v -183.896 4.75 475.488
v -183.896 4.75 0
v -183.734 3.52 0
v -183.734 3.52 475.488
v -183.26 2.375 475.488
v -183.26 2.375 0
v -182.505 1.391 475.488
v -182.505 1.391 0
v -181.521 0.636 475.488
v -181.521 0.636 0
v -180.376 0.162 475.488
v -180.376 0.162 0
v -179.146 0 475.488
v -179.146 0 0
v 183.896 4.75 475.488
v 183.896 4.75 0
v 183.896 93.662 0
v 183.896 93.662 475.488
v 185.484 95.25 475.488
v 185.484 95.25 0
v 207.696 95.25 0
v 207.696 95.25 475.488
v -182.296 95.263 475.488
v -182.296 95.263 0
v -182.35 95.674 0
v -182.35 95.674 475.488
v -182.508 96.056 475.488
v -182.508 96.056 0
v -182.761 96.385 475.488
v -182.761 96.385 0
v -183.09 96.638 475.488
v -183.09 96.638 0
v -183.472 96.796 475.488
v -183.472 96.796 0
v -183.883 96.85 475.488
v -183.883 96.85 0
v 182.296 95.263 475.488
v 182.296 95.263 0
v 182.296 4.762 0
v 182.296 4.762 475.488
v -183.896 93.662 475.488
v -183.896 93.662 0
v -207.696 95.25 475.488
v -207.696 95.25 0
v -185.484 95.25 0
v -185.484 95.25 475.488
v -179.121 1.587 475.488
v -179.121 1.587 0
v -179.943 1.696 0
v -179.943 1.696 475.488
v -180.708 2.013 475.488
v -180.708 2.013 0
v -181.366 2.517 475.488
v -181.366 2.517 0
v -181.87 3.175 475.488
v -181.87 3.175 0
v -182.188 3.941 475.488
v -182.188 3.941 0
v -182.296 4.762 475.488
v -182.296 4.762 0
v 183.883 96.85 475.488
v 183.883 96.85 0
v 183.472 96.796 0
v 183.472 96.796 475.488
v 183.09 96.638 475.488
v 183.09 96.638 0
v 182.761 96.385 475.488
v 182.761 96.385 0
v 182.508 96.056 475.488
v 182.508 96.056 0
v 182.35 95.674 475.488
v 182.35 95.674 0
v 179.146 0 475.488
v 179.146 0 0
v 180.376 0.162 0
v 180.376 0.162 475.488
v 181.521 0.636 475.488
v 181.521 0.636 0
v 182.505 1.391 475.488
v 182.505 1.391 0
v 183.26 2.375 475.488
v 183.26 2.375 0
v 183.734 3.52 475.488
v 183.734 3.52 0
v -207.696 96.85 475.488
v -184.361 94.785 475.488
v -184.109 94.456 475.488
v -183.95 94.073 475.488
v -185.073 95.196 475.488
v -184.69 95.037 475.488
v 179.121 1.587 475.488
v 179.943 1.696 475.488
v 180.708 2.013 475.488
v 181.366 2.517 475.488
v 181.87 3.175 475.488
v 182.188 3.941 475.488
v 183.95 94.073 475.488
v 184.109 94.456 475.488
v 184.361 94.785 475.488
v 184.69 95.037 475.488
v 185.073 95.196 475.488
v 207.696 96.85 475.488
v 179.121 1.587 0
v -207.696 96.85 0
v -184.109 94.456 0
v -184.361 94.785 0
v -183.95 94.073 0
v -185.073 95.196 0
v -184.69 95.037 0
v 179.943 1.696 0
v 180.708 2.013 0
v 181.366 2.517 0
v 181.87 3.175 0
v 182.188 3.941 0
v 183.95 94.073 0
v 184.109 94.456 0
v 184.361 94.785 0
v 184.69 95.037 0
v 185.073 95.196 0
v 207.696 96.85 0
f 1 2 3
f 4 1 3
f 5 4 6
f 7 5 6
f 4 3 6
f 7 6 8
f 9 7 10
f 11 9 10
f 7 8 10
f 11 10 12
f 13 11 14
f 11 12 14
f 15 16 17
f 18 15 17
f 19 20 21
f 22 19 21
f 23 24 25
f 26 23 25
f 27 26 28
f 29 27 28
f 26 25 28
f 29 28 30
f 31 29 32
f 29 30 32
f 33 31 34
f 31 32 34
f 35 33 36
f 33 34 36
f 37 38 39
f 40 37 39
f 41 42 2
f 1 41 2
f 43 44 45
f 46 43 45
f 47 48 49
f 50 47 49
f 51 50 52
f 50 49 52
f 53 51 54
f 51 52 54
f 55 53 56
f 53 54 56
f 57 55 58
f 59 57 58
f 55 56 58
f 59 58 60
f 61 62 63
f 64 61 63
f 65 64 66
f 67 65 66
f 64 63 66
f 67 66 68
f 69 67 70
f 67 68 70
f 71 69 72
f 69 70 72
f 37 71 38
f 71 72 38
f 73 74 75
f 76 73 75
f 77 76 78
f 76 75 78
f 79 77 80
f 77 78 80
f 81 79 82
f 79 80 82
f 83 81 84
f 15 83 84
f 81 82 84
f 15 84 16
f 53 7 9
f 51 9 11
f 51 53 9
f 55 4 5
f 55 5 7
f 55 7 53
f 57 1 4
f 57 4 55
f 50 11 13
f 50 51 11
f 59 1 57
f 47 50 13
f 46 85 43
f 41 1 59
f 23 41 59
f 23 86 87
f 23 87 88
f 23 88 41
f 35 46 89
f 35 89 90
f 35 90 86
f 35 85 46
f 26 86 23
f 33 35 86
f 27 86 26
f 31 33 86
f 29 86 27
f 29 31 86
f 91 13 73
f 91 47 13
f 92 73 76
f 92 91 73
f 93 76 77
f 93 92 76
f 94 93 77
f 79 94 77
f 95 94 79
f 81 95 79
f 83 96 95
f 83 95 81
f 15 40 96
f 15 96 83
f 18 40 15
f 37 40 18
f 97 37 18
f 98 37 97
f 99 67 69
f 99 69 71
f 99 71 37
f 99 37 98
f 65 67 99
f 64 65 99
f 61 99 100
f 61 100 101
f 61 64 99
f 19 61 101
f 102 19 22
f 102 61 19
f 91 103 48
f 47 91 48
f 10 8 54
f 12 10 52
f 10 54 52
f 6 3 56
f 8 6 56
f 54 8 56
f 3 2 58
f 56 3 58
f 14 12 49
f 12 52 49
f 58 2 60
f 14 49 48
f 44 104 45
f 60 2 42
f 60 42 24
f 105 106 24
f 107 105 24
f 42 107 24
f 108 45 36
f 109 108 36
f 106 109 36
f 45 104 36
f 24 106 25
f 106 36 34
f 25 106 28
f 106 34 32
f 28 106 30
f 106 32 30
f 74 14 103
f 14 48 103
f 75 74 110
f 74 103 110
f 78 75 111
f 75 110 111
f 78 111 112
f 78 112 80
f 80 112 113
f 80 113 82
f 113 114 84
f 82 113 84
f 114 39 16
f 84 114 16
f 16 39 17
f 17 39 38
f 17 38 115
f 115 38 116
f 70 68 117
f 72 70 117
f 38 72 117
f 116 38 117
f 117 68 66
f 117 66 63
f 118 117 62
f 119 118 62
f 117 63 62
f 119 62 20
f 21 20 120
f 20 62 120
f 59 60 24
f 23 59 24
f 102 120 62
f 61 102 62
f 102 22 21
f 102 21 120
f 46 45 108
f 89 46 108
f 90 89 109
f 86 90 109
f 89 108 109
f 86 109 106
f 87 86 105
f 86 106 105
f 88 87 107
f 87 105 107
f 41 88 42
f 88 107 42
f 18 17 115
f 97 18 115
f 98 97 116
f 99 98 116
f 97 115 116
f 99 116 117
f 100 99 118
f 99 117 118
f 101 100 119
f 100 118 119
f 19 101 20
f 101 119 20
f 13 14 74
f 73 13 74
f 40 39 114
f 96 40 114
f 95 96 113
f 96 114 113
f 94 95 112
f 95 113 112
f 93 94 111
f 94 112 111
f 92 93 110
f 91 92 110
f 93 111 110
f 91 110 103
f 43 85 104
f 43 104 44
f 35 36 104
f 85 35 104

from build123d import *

# Parameters (mm, degrees)
BOSS_EXTRUDE1_DEPTH = 475.488


with BuildPart() as part:
    # Sketch2 → Boss-Extrude1 (new body)
    with BuildSketch(Plane.XY):
        with BuildLine():
            Line((-179.1462, 0), (179.1462, 0))
            ThreePointArc((179.1462, 0), (182.504815789, 1.391184211), (183.896, 4.7498))
            Line((183.896, 4.7498), (183.896, 93.6625))
            ThreePointArc((183.896, 93.6625), (184.360967985, 94.785032015), (185.4835, 95.25))
            Line((185.4835, 95.25), (207.6958, 95.25))
            Line((207.6958, 95.25), (207.6958, 96.8502))
            Line((207.6958, 96.8502), (183.8833, 96.8502))
            ThreePointArc((183.8833, 96.8502), (182.760767985, 96.385232015), (182.2958, 95.2627))
            Line((182.2958, 95.2627), (182.2958, 4.7625))
            ThreePointArc((182.2958, 4.7625), (181.36586403, 2.51743597), (179.1208, 1.5875))
            Line((179.1208, 1.5875), (-179.1208, 1.5875))
            ThreePointArc((-179.1208, 1.5875), (-181.36586403, 2.51743597), (-182.2958, 4.7625))
            Line((-182.2958, 4.7625), (-182.2958, 95.25))
            Line((-182.2958, 95.25), (-182.2958, 95.2627))
            ThreePointArc((-182.2958, 95.2627), (-182.760767985, 96.385232015), (-183.8833, 96.8502))
            Line((-183.8833, 96.8502), (-207.6958, 96.8502))
            Line((-207.6958, 96.8502), (-207.6958, 95.25))
            Line((-207.6958, 95.25), (-185.4835, 95.25))
            ThreePointArc((-185.4835, 95.25), (-184.360967985, 94.785032015), (-183.896, 93.6625))
            Line((-183.896, 93.6625), (-183.896, 4.7498))
            ThreePointArc((-183.896, 4.7498), (-182.504815789, 1.391184211), (-179.1462, 0))
        make_face()
    extrude(amount=BOSS_EXTRUDE1_DEPTH)


solid = part.part
